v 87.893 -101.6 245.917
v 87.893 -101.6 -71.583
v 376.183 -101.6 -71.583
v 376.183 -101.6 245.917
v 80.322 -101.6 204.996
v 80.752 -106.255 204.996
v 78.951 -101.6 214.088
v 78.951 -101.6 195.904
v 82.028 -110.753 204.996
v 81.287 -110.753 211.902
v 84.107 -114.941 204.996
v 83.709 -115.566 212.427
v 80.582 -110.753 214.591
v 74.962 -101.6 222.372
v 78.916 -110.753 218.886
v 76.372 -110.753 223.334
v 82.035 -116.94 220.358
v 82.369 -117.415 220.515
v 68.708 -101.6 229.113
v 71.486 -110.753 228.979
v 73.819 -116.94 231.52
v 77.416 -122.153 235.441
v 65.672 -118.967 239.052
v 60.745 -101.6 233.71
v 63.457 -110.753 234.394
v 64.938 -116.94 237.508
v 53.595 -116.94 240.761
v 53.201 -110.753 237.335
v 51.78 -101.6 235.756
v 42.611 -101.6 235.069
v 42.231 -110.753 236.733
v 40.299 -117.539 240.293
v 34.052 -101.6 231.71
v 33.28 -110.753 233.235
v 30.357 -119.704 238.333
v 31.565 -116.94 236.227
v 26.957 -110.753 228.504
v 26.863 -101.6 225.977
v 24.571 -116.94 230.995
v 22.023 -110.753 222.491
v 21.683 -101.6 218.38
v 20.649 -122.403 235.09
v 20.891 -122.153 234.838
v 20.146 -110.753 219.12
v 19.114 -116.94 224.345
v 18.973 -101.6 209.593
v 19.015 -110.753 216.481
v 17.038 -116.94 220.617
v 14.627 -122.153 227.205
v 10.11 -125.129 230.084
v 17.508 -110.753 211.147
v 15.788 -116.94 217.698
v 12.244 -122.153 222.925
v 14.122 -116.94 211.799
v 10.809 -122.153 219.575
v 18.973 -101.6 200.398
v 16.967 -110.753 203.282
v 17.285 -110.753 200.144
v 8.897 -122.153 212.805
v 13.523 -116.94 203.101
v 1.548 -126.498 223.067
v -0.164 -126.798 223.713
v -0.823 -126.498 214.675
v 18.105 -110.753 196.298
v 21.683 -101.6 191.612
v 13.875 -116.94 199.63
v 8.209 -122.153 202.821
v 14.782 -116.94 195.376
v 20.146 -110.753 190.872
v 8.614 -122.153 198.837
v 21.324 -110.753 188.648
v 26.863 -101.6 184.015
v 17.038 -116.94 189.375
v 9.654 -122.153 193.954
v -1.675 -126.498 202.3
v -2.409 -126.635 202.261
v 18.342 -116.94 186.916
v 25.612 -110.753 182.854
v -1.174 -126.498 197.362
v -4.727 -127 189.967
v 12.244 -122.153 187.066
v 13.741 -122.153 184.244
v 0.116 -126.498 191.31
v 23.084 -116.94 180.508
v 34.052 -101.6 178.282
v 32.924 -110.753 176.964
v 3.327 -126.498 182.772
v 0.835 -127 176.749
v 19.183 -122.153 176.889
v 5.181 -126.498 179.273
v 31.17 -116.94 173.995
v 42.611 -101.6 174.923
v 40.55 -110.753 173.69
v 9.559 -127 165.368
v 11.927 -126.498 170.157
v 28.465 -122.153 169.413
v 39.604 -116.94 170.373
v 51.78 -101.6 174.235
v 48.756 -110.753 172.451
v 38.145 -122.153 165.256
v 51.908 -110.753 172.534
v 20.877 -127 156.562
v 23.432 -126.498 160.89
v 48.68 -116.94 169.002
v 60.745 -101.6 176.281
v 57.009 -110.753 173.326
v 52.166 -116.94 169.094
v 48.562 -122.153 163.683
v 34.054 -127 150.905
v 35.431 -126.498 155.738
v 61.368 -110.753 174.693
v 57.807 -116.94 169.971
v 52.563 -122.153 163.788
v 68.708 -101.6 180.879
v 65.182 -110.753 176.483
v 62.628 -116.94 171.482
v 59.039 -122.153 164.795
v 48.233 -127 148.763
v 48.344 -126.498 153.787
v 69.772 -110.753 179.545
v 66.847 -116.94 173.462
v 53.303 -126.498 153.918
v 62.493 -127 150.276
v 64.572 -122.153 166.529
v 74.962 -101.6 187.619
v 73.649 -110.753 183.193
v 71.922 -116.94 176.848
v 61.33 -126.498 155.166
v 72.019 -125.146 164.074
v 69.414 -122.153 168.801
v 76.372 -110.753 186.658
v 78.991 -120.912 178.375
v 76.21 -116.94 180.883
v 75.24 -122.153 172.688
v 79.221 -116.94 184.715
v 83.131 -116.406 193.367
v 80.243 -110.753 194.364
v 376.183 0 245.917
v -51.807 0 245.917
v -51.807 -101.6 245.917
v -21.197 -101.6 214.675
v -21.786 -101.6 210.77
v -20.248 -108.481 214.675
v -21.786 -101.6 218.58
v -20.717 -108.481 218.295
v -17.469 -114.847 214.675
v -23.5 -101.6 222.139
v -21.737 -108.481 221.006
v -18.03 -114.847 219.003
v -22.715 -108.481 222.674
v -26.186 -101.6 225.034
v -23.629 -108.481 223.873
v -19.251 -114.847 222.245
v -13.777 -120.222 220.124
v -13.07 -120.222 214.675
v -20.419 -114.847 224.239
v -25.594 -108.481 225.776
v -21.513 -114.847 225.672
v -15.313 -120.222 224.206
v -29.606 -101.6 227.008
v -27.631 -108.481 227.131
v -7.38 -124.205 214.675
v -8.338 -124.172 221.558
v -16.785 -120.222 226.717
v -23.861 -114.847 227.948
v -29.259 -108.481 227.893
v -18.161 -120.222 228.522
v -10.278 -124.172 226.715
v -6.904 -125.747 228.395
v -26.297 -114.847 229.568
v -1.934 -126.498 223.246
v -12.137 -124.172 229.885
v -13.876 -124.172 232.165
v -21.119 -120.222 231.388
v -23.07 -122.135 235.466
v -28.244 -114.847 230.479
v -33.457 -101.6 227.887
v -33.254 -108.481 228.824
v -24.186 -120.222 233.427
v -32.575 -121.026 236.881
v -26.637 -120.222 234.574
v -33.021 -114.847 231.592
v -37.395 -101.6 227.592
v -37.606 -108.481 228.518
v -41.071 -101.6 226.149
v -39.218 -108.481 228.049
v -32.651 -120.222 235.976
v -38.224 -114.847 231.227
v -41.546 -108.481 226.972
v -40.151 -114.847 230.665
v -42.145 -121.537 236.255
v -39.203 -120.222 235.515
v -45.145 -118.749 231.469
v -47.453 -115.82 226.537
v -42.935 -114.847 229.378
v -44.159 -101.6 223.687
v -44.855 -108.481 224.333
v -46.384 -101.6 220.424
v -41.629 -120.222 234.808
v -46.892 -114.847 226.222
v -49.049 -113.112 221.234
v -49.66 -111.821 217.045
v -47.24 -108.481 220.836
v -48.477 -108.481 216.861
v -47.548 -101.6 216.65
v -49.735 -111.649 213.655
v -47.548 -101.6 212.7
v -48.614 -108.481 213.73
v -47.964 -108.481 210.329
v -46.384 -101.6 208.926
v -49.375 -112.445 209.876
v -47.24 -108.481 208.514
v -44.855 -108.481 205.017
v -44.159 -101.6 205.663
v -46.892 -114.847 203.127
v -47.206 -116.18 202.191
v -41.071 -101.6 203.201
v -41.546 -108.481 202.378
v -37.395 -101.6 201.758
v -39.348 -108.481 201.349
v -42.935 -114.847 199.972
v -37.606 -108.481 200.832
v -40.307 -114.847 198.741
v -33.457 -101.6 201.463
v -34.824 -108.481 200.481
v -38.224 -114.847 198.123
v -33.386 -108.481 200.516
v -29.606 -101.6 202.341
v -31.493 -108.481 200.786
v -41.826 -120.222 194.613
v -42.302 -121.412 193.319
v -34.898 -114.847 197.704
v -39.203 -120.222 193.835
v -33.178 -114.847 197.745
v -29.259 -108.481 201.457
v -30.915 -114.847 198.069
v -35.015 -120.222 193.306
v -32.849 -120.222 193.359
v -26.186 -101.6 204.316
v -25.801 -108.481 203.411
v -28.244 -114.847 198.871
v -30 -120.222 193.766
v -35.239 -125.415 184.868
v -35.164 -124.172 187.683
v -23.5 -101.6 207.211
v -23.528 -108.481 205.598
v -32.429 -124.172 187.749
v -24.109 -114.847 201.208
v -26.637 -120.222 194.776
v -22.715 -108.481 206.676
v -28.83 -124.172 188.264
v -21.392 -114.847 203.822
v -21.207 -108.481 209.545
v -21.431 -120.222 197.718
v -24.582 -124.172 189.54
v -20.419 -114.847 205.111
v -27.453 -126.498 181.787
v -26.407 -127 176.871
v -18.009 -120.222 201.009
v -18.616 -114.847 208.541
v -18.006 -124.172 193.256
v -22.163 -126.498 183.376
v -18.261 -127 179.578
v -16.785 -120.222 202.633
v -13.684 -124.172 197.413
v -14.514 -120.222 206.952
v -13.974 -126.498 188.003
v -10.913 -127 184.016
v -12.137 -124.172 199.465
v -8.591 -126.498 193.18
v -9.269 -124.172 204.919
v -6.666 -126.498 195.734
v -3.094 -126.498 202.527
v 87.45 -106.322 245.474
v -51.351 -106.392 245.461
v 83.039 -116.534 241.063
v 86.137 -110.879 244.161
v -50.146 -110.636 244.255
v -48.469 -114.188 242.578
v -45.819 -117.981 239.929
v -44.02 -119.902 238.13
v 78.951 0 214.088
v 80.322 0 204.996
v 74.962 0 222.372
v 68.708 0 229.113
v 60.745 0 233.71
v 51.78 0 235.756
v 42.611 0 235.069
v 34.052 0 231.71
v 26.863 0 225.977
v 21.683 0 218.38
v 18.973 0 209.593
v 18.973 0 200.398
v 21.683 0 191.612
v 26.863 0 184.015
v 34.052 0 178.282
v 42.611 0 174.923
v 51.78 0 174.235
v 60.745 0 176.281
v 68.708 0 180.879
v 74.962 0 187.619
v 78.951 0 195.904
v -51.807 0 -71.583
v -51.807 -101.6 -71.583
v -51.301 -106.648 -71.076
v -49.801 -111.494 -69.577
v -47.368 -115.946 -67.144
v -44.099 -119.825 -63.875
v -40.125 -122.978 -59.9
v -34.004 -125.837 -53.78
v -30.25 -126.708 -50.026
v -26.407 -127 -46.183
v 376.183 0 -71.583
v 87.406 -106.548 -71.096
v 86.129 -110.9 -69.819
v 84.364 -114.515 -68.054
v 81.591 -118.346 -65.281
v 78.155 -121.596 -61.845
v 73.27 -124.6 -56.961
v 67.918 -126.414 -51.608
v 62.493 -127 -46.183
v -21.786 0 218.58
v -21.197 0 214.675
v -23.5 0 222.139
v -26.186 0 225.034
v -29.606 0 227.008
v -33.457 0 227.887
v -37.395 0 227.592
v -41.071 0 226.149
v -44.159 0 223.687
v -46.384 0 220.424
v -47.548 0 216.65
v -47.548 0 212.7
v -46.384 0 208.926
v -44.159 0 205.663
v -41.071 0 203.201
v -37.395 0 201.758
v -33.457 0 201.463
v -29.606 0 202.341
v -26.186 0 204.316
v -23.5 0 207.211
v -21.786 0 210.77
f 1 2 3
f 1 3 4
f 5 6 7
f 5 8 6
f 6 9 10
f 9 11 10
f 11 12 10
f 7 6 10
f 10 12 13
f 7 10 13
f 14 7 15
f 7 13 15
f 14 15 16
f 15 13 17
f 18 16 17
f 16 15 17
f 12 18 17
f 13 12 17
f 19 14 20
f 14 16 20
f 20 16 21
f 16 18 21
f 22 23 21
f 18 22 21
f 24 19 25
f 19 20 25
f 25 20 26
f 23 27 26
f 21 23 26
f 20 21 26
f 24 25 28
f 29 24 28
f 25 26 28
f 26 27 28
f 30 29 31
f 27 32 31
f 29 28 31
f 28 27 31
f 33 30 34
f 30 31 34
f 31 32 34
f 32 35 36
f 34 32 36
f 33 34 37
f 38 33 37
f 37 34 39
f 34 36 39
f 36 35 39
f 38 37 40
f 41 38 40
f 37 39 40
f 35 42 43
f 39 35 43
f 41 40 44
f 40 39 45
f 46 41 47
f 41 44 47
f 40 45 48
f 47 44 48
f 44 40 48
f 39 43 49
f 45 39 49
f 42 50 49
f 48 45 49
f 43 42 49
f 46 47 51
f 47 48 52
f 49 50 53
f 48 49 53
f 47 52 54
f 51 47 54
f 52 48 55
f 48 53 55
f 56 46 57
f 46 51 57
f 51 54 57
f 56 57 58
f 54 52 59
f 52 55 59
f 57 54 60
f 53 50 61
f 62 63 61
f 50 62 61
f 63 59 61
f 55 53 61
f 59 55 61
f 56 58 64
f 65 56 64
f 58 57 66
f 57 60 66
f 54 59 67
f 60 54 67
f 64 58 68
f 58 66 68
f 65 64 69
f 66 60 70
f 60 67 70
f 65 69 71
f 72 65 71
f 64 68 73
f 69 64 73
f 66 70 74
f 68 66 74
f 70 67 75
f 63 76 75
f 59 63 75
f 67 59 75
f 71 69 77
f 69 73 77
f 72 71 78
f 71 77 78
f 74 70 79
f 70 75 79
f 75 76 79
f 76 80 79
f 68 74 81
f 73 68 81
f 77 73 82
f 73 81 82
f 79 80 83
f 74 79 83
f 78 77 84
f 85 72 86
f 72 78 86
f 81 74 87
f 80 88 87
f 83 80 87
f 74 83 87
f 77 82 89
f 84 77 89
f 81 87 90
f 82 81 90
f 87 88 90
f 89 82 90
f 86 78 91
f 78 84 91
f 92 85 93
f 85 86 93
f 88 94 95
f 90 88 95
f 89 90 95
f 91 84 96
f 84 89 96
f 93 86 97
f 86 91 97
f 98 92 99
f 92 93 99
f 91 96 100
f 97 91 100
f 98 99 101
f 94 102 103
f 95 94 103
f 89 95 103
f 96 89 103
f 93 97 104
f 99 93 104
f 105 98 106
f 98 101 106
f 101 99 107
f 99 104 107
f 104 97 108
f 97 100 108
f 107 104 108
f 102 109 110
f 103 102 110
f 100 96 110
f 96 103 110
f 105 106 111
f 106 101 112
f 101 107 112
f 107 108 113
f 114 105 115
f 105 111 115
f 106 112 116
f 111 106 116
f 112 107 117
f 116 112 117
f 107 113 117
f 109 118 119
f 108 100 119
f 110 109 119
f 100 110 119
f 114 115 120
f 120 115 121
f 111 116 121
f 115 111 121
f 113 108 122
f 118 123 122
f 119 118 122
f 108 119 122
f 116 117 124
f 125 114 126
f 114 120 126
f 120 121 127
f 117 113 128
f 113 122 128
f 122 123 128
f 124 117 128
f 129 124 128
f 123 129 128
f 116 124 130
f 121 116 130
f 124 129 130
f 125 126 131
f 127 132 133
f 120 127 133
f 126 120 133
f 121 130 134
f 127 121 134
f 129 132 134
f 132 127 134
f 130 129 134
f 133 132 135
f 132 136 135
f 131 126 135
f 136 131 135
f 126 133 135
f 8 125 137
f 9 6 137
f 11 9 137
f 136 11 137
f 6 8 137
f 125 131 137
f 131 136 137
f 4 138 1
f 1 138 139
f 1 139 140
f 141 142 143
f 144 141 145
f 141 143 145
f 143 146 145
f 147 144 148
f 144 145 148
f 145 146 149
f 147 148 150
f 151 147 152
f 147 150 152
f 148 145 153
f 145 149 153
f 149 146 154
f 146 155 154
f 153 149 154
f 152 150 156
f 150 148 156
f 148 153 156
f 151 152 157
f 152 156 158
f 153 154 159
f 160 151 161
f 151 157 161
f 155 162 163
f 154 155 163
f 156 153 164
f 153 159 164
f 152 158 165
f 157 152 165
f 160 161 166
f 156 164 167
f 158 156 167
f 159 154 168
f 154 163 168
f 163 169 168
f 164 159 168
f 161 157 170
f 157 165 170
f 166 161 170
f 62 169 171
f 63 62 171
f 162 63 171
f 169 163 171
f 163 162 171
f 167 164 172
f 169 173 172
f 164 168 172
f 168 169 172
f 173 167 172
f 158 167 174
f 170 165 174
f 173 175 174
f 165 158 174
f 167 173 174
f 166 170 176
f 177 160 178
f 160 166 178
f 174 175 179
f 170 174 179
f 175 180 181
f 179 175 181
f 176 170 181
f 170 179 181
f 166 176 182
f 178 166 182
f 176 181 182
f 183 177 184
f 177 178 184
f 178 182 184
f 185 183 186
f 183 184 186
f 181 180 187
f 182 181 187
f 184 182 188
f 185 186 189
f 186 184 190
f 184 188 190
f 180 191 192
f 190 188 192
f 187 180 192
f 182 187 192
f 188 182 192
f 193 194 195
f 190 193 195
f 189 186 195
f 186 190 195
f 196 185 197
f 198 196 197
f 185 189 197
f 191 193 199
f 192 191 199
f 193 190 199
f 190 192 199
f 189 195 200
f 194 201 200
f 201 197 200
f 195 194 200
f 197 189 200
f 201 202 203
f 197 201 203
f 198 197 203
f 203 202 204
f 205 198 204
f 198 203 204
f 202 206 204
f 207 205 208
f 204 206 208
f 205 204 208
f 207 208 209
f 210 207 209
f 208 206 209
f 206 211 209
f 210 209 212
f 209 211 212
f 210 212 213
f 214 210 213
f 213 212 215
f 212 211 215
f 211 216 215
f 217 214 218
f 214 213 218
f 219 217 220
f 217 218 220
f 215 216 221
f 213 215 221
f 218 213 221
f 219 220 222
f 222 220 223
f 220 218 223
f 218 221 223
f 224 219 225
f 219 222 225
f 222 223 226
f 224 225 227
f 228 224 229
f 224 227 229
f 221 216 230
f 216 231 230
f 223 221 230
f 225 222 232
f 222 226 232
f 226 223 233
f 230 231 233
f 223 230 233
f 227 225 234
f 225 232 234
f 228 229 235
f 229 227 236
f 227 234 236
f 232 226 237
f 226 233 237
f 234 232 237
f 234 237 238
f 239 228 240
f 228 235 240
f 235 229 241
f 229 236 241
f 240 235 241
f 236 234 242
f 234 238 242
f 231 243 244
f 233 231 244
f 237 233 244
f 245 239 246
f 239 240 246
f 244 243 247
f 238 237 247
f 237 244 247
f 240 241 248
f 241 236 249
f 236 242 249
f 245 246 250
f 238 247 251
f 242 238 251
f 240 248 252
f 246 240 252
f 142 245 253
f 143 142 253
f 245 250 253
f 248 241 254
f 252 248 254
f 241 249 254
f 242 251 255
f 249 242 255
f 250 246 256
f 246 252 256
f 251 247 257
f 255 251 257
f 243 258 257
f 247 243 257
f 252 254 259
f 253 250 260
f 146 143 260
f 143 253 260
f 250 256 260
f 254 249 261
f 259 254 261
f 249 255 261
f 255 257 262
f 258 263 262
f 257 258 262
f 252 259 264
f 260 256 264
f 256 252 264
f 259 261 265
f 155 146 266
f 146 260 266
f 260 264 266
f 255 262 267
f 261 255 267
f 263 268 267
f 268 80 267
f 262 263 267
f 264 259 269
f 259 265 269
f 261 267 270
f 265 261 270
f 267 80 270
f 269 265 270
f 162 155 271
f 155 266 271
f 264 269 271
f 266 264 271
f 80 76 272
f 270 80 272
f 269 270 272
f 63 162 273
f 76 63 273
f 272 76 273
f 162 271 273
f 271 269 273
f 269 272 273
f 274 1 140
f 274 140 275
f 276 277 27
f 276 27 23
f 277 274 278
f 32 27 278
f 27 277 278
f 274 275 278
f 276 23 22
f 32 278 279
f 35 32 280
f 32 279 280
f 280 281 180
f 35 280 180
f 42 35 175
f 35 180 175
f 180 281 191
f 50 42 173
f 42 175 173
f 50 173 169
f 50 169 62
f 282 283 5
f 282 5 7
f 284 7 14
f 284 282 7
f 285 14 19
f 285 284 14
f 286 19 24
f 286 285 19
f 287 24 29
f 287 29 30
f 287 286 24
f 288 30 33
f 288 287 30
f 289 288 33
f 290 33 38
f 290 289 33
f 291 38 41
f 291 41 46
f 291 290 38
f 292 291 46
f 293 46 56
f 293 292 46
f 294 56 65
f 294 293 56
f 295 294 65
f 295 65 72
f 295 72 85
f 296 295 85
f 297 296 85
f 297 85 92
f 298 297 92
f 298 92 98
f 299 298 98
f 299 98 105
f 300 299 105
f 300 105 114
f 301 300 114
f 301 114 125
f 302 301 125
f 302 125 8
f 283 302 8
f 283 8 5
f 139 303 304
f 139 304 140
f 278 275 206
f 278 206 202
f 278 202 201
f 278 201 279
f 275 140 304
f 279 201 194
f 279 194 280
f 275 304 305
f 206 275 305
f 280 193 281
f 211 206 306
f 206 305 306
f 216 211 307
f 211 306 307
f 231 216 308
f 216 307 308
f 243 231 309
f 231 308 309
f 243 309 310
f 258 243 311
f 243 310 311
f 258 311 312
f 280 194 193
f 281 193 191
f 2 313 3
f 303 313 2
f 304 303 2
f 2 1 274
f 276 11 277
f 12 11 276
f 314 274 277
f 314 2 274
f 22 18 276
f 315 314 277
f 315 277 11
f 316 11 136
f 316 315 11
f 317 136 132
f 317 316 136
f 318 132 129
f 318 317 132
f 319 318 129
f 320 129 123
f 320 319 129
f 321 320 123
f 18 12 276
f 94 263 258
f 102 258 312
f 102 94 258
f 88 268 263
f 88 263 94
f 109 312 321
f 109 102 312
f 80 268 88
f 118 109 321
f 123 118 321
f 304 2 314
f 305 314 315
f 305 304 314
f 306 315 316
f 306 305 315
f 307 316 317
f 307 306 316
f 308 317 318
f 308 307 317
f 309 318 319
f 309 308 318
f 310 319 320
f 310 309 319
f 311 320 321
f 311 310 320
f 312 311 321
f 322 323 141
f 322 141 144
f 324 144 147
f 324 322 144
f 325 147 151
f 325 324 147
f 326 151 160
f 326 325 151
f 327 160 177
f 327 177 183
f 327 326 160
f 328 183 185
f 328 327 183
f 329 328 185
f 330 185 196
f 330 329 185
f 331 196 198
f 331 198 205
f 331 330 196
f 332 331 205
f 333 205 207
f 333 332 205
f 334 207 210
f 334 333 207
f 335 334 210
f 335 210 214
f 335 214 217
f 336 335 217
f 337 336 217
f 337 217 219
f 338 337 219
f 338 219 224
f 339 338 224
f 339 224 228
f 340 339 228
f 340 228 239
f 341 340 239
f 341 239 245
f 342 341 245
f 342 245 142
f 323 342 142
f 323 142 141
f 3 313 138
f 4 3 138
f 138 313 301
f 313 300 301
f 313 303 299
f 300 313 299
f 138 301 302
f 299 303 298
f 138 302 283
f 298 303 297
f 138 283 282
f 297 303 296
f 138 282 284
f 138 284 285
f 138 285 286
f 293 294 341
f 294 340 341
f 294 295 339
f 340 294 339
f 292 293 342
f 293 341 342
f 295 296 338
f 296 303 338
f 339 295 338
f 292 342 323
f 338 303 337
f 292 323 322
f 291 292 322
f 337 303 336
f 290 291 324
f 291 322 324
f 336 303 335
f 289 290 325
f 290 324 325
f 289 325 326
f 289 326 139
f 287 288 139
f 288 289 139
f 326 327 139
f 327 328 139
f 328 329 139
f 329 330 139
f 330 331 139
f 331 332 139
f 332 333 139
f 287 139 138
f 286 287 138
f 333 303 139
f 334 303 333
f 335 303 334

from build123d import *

# Parameters (mm, degrees)
F0_W        = 139.7
F0_H        = 317.5
F0_R        = 13.2493993782
F0_R_2      = 30.8467265461
F1_DEPTH    = 127
F2_T1_DEPTH = 266.7
F2_T3_DEPTH = 444.5
F3_DEPTH    = 288.29


# Not quite as in the source:
# - a fillet or chamfer that OpenCascade refuses, or shapes differently, is made with other operations: its cross-section is extruded or revolved along the edge and cut away or added


with BuildPart() as f1:
    # F0 (on Front) → F1 (new body)
    with BuildSketch(Plane.XZ):
        with Locations((18.042704469, 87.1669226885)):
            Rectangle(F0_W, F0_H)
        with Locations((-34.4466865063, 214.674949646)):
            Circle(F0_R, mode=Mode.SUBTRACT)
        with Locations((49.4750849903, 204.995855689)):
            Circle(F0_R_2, mode=Mode.SUBTRACT)
    extrude(amount=F1_DEPTH)

    # F2: fillet of radius 25.4 on 6 edges, made by hand

    # F2_s2 → F2_t1 (cut)
    with BuildSketch(Plane.YZ.offset(-115.307295531)):
        with BuildLine():
            ThreePointArc((-101.6, 245.9169226885), (-119.5605122421, 238.4774349306), (-127, 220.5169226885))
            Line((-127, 220.5169226885), (-127, 245.9169226885))
            Line((-127, 245.9169226885), (-101.6, 245.9169226885))
        make_face()
        with BuildLine():
            ThreePointArc((-101.6, -71.5830773115), (-119.5605122421, -64.1435895537), (-127, -46.1830773115))
            Line((-127, -46.1830773115), (-127, -71.5830773115))
            Line((-127, -71.5830773115), (-101.6, -71.5830773115))
        make_face()
    extrude(amount=F2_T1_DEPTH, mode=Mode.SUBTRACT)

    # F2_s4 → F2_t3 (cut)
    with BuildSketch(Plane.XY.offset(-135.0830773115)):
        with BuildLine():
            ThreePointArc((-51.807295531, -101.6), (-44.3678077732, -119.5605122421), (-26.407295531, -127))
            Line((-26.407295531, -127), (-51.807295531, -127))
            Line((-51.807295531, -127), (-51.807295531, -101.6))
        make_face()
        with BuildLine():
            ThreePointArc((87.892704469, -101.6), (80.4532167111, -119.5605122421), (62.492704469, -127))
            Line((62.492704469, -127), (87.892704469, -127))
            Line((87.892704469, -127), (87.892704469, -101.6))
        make_face()
    extrude(amount=F2_T3_DEPTH, mode=Mode.SUBTRACT)

    # F2_s5 → F2_t6 (revolve, cut)
    with BuildSketch(Plane.XY.offset(214.674949646)):
        with BuildLine():
            ThreePointArc((-21.197287128, -101.6), (-13.7577993702, -119.5605122421), (4.202712872, -127))
            Line((4.202712872, -127), (-21.197287128, -127))
            Line((-21.197287128, -127), (-21.197287128, -101.6))
        make_face()
    revolve(axis=Axis((-34.4466865063, -127, 214.674949646), (0, -1, 0)), mode=Mode.SUBTRACT)

    # F2_s7 → F2_t8 (revolve, cut)
    with BuildSketch(Plane.XY.offset(204.995855689)):
        with BuildLine():
            ThreePointArc((80.3218115364, -101.6), (87.7612992942, -119.5605122421), (105.7218115364, -127))
            Line((105.7218115364, -127), (80.3218115364, -127))
            Line((80.3218115364, -127), (80.3218115364, -101.6))
        make_face()
    revolve(axis=Axis((49.4750849903, -127, 204.995855689), (0, -1, 0)), mode=Mode.SUBTRACT)

    # F3 (add): a face of the model
    f3_faces = [f1.faces().sort_by_distance(p)[0] for p in [
        (87.892704469, -50.8, 87.1669226885),
    ]]
    extrude(f3_faces, amount=F3_DEPTH)


solid = f1.part
